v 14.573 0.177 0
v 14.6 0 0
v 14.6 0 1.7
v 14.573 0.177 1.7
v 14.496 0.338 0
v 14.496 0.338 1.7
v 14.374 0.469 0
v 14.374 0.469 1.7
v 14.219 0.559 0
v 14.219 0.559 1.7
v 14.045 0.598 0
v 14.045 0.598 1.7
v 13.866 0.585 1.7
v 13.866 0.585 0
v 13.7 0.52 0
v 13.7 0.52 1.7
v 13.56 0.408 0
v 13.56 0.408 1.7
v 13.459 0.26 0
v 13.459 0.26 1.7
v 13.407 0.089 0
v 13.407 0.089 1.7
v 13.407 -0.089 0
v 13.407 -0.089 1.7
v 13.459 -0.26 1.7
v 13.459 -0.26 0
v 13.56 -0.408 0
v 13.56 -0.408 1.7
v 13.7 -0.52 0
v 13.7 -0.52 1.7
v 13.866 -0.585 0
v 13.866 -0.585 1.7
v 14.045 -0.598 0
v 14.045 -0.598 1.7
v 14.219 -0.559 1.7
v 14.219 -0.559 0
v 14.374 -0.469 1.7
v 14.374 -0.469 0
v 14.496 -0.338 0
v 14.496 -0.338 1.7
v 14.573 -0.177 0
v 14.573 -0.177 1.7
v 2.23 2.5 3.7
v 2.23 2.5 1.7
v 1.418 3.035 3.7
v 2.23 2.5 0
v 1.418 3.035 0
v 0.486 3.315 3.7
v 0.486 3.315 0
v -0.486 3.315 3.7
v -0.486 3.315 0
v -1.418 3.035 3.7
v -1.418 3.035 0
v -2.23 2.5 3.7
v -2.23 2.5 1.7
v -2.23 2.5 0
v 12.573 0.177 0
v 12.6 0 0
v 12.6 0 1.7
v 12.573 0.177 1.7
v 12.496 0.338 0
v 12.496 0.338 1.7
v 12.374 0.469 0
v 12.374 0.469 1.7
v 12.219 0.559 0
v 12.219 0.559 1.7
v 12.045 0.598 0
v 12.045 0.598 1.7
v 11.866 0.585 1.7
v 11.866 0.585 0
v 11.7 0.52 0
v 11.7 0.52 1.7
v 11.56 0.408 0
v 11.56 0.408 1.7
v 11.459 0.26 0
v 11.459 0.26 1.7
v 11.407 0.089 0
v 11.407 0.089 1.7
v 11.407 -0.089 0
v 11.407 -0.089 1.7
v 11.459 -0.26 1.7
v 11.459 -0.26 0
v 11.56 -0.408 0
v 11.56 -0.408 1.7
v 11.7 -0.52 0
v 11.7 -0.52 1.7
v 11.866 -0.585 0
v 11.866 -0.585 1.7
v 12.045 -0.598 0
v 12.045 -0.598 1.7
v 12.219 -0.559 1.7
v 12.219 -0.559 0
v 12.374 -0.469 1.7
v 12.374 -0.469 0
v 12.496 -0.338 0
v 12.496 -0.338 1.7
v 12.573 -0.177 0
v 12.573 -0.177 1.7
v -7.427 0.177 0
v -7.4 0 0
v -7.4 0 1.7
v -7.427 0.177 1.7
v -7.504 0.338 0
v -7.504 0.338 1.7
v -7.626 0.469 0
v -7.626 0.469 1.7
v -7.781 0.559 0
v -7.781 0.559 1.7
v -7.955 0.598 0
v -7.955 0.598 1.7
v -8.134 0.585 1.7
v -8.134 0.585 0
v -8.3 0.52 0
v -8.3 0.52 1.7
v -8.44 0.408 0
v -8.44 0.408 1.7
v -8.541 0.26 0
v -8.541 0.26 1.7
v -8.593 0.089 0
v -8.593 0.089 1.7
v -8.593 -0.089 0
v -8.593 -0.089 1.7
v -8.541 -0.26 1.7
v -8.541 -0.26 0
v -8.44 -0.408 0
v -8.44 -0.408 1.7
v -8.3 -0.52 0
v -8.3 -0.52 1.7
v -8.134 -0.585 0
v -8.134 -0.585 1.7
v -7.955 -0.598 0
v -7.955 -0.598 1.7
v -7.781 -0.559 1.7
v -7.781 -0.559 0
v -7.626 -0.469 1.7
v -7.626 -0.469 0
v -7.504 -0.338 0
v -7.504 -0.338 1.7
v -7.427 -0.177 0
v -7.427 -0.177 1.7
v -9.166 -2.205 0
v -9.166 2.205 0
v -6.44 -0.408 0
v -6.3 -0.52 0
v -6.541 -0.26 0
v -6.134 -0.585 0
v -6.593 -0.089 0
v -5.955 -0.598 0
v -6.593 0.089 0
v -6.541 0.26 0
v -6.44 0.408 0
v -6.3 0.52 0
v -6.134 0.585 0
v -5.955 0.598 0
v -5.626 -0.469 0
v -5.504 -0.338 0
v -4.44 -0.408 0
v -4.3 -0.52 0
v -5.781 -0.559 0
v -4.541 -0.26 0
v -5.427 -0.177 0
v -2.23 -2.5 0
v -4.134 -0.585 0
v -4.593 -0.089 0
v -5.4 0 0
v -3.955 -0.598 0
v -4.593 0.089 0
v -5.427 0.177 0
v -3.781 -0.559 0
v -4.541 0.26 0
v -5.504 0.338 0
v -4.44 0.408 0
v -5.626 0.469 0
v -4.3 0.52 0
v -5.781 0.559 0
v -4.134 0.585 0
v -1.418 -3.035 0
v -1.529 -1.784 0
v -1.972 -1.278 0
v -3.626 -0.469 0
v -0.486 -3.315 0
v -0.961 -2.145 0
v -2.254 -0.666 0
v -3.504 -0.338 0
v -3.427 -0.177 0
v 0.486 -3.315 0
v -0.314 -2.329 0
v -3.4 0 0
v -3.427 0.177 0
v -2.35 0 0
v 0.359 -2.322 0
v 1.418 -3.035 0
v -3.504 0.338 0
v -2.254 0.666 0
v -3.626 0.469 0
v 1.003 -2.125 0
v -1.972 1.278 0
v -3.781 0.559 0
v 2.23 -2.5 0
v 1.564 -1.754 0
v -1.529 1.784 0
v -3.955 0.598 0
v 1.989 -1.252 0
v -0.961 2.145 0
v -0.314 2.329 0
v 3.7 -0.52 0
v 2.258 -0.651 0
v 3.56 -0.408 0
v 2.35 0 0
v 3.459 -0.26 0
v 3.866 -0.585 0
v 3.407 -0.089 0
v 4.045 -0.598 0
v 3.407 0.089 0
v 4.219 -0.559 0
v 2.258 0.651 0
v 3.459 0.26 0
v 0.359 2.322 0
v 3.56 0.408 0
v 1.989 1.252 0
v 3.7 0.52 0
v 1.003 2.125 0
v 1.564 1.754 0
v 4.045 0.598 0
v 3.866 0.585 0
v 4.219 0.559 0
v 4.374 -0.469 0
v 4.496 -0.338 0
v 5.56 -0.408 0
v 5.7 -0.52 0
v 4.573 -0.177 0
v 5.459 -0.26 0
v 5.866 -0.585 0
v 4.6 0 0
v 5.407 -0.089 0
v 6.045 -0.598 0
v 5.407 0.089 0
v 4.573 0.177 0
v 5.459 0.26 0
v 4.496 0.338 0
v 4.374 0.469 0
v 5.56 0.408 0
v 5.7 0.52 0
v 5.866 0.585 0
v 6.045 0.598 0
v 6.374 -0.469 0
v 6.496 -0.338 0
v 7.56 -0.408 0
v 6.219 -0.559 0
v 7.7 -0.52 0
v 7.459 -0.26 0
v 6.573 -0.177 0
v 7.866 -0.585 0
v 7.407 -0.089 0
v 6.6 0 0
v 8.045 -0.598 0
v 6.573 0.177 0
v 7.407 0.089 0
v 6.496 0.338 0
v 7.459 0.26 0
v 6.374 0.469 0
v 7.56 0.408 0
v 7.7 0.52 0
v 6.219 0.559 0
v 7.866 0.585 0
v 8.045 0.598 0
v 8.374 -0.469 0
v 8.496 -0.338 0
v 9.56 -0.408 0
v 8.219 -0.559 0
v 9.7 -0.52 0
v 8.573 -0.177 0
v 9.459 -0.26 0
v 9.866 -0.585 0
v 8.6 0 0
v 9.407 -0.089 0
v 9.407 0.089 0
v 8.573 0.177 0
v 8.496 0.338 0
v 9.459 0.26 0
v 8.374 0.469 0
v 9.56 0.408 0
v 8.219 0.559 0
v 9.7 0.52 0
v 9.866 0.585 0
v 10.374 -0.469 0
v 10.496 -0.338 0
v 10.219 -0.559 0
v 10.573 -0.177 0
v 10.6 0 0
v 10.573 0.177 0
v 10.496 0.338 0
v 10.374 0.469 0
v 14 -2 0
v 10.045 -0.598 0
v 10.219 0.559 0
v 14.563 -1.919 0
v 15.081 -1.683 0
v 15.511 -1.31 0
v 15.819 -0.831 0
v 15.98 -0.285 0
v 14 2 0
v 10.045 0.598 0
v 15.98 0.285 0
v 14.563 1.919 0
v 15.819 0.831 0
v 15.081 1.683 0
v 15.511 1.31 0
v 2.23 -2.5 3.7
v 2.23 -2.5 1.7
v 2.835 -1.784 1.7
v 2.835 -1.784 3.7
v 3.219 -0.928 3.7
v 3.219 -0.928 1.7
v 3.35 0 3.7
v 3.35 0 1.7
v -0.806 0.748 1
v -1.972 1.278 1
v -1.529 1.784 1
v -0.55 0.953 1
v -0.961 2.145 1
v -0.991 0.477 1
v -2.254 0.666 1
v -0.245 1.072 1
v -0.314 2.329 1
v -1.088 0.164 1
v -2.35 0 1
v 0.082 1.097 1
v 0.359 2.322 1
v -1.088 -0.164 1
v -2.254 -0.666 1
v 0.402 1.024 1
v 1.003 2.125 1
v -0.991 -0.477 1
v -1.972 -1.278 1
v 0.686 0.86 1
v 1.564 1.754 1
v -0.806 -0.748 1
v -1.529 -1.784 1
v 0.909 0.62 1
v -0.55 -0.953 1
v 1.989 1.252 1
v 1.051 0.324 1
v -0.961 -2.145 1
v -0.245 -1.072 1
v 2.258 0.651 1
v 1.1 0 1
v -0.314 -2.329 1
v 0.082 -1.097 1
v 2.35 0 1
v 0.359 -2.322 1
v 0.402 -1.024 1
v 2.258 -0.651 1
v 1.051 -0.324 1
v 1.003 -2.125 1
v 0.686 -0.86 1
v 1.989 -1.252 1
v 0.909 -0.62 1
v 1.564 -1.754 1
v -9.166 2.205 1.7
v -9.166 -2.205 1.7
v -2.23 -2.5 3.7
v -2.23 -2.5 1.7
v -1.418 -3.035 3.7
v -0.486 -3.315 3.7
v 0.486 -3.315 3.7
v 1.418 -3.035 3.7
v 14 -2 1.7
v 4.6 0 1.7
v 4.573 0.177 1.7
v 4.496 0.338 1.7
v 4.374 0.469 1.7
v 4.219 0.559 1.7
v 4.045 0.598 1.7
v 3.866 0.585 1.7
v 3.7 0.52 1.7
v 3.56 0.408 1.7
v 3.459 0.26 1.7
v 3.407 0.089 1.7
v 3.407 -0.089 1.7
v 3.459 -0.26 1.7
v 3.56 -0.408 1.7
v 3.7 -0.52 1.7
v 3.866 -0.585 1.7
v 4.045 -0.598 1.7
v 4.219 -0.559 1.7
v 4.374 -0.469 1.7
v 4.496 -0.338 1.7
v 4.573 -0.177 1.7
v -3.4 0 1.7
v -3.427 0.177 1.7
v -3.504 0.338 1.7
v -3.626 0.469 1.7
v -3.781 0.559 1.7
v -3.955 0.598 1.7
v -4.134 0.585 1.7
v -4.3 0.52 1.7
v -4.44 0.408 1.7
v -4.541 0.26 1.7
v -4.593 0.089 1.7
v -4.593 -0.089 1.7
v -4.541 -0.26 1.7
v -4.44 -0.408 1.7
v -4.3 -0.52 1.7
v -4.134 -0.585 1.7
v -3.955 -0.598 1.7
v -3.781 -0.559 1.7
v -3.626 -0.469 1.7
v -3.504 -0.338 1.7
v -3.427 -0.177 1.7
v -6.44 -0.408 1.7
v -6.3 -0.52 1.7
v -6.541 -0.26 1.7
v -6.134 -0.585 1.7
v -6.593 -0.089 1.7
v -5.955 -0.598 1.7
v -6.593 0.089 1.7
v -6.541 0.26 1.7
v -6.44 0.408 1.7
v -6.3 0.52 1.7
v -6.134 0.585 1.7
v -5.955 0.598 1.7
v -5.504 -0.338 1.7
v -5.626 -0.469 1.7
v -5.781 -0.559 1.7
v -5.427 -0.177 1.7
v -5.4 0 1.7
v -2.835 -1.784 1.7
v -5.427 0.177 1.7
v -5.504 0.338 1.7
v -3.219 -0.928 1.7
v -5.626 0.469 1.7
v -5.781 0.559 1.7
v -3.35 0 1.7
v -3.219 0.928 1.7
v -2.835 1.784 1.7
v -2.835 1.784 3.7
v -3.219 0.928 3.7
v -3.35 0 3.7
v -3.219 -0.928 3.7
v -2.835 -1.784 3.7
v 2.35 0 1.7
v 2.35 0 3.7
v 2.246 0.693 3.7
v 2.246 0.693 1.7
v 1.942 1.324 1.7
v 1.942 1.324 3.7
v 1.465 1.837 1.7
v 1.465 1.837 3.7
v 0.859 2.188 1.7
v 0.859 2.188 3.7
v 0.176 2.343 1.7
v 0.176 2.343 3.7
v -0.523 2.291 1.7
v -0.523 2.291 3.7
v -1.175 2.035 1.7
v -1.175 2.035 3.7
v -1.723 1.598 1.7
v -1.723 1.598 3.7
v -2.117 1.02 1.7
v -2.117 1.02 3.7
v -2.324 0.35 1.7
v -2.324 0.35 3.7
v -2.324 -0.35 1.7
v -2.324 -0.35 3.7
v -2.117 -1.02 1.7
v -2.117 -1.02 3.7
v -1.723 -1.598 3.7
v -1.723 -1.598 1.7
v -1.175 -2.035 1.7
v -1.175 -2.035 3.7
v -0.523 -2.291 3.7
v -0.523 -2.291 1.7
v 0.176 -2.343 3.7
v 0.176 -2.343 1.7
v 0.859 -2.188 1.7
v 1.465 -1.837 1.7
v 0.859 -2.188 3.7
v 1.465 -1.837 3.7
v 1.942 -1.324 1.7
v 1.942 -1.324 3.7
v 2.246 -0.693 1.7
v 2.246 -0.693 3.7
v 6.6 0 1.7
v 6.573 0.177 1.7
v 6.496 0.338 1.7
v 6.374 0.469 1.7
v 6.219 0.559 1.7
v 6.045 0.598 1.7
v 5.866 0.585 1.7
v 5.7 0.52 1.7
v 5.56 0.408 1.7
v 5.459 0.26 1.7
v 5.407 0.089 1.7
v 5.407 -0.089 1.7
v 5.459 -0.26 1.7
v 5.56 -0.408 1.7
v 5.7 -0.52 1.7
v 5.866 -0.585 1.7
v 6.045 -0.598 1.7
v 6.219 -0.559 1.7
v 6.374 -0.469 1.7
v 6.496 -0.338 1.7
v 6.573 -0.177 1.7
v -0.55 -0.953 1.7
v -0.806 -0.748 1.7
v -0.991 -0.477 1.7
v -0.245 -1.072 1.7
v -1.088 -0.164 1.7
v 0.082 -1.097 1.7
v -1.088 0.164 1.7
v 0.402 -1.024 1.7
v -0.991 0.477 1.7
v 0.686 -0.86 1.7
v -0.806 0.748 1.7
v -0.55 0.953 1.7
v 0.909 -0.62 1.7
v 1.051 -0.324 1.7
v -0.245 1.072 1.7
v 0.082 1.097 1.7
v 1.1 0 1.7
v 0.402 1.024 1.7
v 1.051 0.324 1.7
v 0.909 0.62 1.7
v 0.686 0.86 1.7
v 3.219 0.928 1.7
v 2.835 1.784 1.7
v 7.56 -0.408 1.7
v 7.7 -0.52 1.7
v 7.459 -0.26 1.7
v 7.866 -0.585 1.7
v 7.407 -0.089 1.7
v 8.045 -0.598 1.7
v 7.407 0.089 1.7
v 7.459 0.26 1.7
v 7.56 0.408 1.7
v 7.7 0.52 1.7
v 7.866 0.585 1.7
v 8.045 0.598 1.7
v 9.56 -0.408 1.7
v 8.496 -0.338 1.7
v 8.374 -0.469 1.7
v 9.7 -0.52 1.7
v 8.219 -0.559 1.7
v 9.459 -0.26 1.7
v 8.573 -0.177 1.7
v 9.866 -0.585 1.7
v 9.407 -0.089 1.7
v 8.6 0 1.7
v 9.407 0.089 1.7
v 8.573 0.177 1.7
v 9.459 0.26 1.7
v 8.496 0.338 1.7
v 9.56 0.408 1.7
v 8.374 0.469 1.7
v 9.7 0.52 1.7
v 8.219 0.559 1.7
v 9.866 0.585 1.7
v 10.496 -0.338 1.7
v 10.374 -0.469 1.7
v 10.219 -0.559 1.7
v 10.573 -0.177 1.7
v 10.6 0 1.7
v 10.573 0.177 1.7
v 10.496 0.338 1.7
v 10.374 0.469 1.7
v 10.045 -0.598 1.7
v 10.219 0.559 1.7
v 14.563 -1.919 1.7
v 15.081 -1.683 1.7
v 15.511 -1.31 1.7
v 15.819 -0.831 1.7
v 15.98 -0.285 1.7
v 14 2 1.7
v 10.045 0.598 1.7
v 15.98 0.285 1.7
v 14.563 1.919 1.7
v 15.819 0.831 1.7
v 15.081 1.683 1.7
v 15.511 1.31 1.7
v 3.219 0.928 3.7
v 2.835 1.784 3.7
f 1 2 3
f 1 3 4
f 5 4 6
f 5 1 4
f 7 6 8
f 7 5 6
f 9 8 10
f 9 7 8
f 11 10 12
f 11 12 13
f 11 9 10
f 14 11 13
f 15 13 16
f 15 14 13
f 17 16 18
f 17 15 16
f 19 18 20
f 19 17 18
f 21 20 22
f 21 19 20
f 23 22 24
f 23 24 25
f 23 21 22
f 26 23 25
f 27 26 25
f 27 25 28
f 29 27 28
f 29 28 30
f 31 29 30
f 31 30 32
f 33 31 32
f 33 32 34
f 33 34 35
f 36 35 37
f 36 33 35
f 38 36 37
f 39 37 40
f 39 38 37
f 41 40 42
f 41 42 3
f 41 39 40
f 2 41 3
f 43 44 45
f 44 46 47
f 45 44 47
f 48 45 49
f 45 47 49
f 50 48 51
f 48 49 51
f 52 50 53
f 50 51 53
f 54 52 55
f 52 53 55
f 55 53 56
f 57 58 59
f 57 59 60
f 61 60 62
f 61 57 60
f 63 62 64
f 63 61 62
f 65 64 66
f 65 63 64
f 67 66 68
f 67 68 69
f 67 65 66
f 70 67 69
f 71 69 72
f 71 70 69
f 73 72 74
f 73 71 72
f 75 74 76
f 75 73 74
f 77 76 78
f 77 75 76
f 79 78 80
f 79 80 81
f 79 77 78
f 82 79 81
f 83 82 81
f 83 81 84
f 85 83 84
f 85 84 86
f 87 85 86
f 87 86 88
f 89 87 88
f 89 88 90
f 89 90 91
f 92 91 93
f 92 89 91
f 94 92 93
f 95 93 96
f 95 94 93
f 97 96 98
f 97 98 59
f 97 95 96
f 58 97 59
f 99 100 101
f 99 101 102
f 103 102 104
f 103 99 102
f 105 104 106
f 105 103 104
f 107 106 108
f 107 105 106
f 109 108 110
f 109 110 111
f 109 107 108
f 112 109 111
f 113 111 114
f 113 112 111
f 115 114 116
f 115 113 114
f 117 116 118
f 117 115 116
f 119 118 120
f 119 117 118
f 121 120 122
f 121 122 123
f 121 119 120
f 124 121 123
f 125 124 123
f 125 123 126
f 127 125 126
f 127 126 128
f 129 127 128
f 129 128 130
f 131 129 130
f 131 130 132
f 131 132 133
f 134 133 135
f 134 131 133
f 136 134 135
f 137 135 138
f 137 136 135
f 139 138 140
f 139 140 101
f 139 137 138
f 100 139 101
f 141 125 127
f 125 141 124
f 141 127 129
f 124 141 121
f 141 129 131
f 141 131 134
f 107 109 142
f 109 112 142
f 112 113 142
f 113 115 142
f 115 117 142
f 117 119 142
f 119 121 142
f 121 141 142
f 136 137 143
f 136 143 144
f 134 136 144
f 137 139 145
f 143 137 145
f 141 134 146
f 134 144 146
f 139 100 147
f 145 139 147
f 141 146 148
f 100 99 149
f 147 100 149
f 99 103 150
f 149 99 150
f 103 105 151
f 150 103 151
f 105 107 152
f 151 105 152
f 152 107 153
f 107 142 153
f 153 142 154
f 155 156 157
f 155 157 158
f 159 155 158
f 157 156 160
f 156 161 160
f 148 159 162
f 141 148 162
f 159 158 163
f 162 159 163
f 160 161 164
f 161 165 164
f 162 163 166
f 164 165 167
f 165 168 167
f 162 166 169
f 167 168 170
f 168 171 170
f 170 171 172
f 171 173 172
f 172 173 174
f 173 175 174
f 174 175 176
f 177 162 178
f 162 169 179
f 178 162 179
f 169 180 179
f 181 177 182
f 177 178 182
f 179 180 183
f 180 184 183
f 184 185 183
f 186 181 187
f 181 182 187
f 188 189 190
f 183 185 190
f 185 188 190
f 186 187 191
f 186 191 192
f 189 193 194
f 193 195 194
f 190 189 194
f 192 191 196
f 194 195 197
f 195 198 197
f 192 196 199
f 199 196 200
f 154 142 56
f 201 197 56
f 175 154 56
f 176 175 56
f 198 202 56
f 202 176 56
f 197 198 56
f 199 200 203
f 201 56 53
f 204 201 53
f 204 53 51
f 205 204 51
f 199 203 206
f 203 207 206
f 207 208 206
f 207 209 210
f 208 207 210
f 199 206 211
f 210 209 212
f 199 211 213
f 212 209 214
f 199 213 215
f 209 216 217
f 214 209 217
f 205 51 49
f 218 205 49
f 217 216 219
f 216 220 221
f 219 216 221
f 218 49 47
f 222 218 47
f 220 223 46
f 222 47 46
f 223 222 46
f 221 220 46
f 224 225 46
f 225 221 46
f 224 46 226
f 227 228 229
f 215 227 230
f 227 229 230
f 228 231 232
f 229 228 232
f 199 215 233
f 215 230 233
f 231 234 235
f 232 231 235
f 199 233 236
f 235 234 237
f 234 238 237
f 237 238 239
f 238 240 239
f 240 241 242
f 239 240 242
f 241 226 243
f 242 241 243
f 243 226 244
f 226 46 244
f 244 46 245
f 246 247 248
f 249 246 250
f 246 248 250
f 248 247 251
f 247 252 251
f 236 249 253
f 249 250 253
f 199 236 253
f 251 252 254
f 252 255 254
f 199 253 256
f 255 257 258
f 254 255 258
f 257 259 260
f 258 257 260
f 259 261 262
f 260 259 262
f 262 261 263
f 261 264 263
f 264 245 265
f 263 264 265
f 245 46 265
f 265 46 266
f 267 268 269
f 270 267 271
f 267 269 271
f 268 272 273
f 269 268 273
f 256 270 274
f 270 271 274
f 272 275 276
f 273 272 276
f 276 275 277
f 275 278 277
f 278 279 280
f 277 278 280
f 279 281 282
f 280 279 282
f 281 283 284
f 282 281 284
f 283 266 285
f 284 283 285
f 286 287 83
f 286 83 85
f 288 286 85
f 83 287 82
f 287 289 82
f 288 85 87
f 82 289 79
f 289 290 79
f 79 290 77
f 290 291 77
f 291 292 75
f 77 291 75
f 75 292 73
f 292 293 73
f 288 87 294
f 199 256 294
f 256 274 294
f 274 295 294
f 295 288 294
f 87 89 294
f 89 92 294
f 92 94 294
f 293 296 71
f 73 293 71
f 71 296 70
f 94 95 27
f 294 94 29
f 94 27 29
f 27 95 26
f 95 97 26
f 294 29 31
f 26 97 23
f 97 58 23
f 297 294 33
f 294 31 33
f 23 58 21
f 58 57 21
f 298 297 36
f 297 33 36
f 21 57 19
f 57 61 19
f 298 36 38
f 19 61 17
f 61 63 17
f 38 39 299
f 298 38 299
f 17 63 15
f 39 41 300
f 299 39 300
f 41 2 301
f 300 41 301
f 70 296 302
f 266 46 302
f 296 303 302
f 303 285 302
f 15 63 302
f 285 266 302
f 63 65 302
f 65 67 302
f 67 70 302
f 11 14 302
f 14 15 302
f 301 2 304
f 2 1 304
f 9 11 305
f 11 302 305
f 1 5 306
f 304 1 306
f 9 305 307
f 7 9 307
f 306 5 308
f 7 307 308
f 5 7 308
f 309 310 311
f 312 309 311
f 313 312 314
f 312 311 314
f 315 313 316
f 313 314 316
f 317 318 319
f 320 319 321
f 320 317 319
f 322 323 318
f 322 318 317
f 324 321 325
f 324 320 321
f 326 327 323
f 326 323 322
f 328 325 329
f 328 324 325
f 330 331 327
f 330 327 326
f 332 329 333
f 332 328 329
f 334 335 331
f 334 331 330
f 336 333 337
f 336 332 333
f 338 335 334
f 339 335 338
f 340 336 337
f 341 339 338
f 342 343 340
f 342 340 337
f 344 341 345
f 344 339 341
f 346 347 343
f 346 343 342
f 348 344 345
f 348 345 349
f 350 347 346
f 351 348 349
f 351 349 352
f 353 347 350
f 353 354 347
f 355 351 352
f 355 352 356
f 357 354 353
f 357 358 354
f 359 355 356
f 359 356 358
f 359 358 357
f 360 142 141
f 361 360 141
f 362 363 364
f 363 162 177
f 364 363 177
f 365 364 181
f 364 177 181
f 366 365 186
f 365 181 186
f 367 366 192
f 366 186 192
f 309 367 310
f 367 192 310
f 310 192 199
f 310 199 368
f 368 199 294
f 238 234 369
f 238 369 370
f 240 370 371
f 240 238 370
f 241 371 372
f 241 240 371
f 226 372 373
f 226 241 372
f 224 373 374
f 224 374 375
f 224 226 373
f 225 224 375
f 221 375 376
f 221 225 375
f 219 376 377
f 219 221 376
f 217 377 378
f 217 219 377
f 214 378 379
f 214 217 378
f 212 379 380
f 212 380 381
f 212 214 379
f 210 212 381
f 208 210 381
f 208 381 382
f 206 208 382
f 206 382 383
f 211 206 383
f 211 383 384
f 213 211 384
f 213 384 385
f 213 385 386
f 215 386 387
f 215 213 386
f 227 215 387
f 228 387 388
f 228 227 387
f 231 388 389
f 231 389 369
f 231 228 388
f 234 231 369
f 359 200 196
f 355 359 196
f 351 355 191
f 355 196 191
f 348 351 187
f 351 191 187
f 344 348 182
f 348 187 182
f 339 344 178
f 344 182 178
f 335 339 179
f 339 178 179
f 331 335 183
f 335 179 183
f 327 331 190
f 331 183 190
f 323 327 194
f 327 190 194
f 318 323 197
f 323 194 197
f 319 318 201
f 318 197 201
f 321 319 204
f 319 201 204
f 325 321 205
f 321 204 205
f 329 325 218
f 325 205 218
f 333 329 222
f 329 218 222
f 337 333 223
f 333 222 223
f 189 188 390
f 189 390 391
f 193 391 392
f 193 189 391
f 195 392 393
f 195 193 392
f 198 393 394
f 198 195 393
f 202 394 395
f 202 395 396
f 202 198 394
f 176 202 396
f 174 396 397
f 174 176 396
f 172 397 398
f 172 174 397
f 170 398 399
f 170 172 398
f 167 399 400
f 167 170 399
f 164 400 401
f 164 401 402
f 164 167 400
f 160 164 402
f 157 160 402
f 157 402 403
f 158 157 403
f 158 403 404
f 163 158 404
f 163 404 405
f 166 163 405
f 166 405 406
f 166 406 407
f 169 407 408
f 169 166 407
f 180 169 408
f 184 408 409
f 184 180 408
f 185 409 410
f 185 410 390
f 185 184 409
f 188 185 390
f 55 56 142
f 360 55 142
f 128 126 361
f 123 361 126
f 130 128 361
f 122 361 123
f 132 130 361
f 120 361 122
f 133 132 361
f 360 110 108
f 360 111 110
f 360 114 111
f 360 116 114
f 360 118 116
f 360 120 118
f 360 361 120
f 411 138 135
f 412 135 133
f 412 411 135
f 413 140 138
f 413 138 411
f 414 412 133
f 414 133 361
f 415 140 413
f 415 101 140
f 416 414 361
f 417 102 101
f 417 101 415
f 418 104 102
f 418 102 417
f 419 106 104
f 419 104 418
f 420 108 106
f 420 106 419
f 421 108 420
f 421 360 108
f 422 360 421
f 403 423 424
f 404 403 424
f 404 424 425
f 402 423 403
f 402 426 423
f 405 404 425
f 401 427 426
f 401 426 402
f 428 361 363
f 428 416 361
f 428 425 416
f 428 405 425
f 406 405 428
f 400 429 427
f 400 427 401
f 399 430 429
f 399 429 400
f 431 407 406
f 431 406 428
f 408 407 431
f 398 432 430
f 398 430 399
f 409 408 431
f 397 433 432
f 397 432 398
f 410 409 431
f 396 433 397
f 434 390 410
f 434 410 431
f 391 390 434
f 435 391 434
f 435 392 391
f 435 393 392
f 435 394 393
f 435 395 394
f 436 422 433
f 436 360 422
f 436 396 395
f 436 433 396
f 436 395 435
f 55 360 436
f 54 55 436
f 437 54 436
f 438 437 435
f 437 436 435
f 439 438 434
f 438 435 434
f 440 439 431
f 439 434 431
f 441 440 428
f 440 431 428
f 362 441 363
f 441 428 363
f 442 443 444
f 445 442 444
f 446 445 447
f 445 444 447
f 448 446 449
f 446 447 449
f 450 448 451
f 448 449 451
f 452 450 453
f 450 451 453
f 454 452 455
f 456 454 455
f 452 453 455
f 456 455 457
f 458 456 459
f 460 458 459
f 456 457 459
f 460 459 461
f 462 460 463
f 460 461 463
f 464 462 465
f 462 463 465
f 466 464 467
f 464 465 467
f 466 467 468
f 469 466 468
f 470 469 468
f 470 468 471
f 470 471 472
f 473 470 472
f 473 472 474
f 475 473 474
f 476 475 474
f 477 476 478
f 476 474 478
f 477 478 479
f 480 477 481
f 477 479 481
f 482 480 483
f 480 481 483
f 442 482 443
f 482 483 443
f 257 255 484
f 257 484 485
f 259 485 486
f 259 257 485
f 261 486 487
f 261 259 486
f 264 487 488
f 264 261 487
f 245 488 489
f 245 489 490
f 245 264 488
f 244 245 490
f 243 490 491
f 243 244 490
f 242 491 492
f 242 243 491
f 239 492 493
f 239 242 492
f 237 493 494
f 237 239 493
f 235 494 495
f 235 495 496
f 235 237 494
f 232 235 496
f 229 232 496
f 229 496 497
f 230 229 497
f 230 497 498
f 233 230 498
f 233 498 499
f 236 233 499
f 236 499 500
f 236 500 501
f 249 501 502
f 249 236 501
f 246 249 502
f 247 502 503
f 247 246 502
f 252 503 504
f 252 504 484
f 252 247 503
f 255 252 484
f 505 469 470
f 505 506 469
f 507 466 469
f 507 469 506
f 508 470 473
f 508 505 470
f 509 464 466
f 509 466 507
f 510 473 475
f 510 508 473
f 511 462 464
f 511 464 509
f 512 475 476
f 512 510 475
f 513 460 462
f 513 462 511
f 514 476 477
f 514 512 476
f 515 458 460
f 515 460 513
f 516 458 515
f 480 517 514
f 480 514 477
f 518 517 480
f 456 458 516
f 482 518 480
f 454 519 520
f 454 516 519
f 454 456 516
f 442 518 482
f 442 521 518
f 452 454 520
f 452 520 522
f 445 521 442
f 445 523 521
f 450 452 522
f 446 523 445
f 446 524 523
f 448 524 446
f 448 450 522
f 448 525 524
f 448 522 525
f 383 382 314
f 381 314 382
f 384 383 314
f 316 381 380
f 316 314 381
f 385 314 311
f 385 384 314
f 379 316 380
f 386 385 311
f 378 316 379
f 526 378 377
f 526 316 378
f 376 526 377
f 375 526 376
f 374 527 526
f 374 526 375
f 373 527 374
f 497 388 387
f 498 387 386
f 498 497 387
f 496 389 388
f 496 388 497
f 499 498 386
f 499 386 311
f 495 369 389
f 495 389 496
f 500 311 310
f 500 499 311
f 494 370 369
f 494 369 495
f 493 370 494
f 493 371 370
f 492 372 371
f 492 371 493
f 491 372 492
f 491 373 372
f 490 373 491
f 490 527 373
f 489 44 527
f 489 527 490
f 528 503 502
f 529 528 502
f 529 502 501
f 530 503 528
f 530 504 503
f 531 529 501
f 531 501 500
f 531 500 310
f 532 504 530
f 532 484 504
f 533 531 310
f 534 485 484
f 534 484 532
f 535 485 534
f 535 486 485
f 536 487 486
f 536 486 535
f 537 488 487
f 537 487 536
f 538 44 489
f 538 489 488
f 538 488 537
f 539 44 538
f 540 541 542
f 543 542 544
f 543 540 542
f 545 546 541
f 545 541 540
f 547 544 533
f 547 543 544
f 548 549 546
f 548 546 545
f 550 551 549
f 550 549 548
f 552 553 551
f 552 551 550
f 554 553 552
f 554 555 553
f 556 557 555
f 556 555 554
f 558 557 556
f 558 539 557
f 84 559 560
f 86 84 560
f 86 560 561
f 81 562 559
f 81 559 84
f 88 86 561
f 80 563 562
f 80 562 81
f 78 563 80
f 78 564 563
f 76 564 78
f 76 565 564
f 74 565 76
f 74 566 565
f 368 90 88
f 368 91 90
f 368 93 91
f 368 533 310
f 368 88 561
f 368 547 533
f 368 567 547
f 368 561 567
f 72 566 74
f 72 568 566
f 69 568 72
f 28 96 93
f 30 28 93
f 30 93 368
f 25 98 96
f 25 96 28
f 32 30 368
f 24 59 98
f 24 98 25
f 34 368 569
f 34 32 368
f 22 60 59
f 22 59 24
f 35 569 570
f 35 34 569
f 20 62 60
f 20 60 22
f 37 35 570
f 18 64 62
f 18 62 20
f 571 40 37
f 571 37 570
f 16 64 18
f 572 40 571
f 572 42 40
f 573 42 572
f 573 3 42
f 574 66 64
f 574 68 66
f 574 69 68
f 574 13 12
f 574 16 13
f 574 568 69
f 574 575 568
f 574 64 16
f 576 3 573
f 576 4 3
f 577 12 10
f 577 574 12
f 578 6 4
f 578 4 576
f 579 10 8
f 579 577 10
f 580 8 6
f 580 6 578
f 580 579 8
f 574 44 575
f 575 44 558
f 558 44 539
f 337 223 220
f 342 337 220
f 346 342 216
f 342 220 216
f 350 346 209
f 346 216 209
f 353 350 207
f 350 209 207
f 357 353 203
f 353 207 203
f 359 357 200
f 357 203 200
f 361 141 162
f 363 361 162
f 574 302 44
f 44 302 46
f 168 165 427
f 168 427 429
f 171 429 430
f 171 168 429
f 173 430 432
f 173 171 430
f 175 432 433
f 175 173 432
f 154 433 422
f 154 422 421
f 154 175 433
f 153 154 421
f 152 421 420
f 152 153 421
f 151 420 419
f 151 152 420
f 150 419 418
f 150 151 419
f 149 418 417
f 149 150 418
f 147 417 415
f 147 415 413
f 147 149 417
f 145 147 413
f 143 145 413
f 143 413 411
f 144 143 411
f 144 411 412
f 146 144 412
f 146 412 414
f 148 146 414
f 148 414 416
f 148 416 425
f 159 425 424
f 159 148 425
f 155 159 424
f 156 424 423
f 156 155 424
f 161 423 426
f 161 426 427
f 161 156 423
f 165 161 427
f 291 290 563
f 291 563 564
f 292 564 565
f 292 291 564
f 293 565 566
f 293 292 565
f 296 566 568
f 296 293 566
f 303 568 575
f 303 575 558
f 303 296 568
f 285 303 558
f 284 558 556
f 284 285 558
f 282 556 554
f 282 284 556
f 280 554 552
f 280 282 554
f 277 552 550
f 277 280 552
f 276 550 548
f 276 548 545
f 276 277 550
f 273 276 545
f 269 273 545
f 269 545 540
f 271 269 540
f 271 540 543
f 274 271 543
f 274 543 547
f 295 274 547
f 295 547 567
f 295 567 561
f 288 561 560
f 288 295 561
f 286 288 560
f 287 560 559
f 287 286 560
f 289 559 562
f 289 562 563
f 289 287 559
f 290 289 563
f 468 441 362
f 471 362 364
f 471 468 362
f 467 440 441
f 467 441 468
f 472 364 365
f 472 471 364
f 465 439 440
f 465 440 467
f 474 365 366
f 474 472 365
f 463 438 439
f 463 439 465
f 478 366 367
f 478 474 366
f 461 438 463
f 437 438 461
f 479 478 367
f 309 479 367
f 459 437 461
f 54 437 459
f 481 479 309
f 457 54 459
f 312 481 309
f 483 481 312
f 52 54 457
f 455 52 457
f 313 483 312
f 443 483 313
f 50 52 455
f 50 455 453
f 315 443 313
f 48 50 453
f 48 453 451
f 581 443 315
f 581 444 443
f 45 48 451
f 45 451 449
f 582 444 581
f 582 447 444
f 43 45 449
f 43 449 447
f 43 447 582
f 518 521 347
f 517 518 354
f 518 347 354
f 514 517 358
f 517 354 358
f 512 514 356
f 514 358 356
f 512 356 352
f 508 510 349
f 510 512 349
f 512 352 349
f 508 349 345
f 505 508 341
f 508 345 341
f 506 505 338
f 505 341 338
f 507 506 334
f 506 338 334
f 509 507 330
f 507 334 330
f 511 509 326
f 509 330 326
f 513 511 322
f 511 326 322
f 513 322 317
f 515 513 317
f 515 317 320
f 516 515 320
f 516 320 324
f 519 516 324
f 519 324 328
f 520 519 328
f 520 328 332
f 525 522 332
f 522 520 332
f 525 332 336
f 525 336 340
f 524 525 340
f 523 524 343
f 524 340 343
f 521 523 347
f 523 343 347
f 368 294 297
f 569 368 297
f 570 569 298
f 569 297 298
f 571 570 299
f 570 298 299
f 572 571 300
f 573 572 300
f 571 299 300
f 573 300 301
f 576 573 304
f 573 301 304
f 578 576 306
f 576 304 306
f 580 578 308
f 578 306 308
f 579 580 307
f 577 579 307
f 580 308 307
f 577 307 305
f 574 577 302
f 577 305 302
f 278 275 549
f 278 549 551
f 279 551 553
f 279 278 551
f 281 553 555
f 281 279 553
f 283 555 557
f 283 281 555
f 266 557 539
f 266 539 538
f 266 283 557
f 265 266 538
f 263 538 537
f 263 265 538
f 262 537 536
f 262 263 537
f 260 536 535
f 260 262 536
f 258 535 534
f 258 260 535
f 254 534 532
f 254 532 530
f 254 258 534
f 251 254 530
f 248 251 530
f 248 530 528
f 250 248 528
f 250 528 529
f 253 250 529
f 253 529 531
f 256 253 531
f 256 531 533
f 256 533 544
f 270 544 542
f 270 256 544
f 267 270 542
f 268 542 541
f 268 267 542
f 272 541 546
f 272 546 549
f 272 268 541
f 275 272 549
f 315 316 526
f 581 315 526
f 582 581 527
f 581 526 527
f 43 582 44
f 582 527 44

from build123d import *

# Parameters (mm, degrees)
F0_R     = 0.6
F1_DEPTH = 1.7
F3_DEPTH = 2
F5_DEPTH = 1
F6_R     = 1.1
F7_DEPTH = 2.701
F8_R     = 2.35
F8_R_2   = 1.1
F9_DEPTH = 2


with BuildPart() as f1:
    # F0 (on Top) → F1 (new body)
    with BuildSketch(Plane.XY):
        with BuildLine():
            ThreePointArc((2.2299103121, -2.5), (3.057180036, -1.369726333), (3.35, 0))
            ThreePointArc((3.35, 0), (3.057180036, 1.369726333), (2.2299103121, 2.5))
            ThreePointArc((2.2299103121, 2.5), (0, 3.35), (-2.2299103121, 2.5))
            ThreePointArc((-2.2299103121, 2.5), (-3.35, 0), (-2.2299103121, -2.5))
            ThreePointArc((-2.2299103121, -2.5), (0, -3.35), (2.2299103121, -2.5))
        make_face()
        with BuildLine():
            ThreePointArc((2.2299103121, 2.5), (3.057180036, 1.369726333), (3.35, 0))
            ThreePointArc((3.35, 0), (3.057180036, -1.369726333), (2.2299103121, -2.5))
            Line((2.2299103121, -2.5), (14, -2))
            ThreePointArc((14, -2), (16, 0), (14, 2))
            Line((14, 2), (2.2299103121, 2.5))
        make_face()
        with Locations((4, 0)):
            Circle(F0_R, mode=Mode.SUBTRACT)
        with Locations((6, 0)):
            Circle(F0_R, mode=Mode.SUBTRACT)
        with Locations((8, 0)):
            Circle(F0_R, mode=Mode.SUBTRACT)
        with Locations((10, 0)):
            Circle(F0_R, mode=Mode.SUBTRACT)
        with Locations((12, 0)):
            Circle(F0_R, mode=Mode.SUBTRACT)
        with Locations((14, 0)):
            Circle(F0_R, mode=Mode.SUBTRACT)
        with BuildLine():
            ThreePointArc((-2.2299103121, -2.5), (-3.35, 0), (-2.2299103121, 2.5))
            Line((-2.2299103121, 2.5), (-9.1662129992, 2.2053419782))
            Line((-9.1662129992, 2.2053419782), (-9.1662129992, -2.2053419782))
            Line((-9.1662129992, -2.2053419782), (-2.2299103121, -2.5))
        make_face()
        with Locations((-8, 0)):
            Circle(F0_R, mode=Mode.SUBTRACT)
        with Locations((-6, 0)):
            Circle(F0_R, mode=Mode.SUBTRACT)
        with Locations((-4, 0)):
            Circle(F0_R, mode=Mode.SUBTRACT)
    extrude(amount=F1_DEPTH)

    # F2 (on face) → F3 (join)
    with BuildSketch(Plane.XY.offset(1.7)):
        with BuildLine():
            ThreePointArc((2.2299103121, -2.5), (3.057180036, -1.369726333), (3.35, 0))
            ThreePointArc((3.35, 0), (3.057180036, 1.369726333), (2.2299103121, 2.5))
            ThreePointArc((2.2299103121, 2.5), (0, 3.35), (-2.2299103121, 2.5))
            ThreePointArc((-2.2299103121, 2.5), (-3.35, 0), (-2.2299103121, -2.5))
            ThreePointArc((-2.2299103121, -2.5), (0, -3.35), (2.2299103121, -2.5))
        make_face()
    extrude(amount=F3_DEPTH)

    # F4 (on face) → F5 (cut)
    with BuildSketch(Plane(origin=(0, 0, 0), x_dir=(1, 0, 0), z_dir=(0, 0, -1))):
        with BuildLine():
            ThreePointArc((1.5642654428, 1.7537313433), (-2.35, 0), (1.5642654428, -1.7537313433))
            ThreePointArc((1.5642654428, -1.7537313433), (2.35, 0), (1.5642654428, 1.7537313433))
        make_face()
    extrude(amount=-F5_DEPTH, mode=Mode.SUBTRACT)

    # F6 (on face) → F7 (cut, through all)
    with BuildSketch(Plane(origin=(0, 0, 1), x_dir=(1, 0, 0), z_dir=(0, 0, -1))):
        Circle(F6_R)
    extrude(amount=-F7_DEPTH, mode=Mode.SUBTRACT)

    # F8 (on face) → F9 (cut, through all)
    with BuildSketch(Plane.XY.offset(3.7)):
        Circle(F8_R)
        Circle(F8_R_2, mode=Mode.SUBTRACT)
    extrude(amount=-F9_DEPTH, mode=Mode.SUBTRACT)


solid = f1.part
